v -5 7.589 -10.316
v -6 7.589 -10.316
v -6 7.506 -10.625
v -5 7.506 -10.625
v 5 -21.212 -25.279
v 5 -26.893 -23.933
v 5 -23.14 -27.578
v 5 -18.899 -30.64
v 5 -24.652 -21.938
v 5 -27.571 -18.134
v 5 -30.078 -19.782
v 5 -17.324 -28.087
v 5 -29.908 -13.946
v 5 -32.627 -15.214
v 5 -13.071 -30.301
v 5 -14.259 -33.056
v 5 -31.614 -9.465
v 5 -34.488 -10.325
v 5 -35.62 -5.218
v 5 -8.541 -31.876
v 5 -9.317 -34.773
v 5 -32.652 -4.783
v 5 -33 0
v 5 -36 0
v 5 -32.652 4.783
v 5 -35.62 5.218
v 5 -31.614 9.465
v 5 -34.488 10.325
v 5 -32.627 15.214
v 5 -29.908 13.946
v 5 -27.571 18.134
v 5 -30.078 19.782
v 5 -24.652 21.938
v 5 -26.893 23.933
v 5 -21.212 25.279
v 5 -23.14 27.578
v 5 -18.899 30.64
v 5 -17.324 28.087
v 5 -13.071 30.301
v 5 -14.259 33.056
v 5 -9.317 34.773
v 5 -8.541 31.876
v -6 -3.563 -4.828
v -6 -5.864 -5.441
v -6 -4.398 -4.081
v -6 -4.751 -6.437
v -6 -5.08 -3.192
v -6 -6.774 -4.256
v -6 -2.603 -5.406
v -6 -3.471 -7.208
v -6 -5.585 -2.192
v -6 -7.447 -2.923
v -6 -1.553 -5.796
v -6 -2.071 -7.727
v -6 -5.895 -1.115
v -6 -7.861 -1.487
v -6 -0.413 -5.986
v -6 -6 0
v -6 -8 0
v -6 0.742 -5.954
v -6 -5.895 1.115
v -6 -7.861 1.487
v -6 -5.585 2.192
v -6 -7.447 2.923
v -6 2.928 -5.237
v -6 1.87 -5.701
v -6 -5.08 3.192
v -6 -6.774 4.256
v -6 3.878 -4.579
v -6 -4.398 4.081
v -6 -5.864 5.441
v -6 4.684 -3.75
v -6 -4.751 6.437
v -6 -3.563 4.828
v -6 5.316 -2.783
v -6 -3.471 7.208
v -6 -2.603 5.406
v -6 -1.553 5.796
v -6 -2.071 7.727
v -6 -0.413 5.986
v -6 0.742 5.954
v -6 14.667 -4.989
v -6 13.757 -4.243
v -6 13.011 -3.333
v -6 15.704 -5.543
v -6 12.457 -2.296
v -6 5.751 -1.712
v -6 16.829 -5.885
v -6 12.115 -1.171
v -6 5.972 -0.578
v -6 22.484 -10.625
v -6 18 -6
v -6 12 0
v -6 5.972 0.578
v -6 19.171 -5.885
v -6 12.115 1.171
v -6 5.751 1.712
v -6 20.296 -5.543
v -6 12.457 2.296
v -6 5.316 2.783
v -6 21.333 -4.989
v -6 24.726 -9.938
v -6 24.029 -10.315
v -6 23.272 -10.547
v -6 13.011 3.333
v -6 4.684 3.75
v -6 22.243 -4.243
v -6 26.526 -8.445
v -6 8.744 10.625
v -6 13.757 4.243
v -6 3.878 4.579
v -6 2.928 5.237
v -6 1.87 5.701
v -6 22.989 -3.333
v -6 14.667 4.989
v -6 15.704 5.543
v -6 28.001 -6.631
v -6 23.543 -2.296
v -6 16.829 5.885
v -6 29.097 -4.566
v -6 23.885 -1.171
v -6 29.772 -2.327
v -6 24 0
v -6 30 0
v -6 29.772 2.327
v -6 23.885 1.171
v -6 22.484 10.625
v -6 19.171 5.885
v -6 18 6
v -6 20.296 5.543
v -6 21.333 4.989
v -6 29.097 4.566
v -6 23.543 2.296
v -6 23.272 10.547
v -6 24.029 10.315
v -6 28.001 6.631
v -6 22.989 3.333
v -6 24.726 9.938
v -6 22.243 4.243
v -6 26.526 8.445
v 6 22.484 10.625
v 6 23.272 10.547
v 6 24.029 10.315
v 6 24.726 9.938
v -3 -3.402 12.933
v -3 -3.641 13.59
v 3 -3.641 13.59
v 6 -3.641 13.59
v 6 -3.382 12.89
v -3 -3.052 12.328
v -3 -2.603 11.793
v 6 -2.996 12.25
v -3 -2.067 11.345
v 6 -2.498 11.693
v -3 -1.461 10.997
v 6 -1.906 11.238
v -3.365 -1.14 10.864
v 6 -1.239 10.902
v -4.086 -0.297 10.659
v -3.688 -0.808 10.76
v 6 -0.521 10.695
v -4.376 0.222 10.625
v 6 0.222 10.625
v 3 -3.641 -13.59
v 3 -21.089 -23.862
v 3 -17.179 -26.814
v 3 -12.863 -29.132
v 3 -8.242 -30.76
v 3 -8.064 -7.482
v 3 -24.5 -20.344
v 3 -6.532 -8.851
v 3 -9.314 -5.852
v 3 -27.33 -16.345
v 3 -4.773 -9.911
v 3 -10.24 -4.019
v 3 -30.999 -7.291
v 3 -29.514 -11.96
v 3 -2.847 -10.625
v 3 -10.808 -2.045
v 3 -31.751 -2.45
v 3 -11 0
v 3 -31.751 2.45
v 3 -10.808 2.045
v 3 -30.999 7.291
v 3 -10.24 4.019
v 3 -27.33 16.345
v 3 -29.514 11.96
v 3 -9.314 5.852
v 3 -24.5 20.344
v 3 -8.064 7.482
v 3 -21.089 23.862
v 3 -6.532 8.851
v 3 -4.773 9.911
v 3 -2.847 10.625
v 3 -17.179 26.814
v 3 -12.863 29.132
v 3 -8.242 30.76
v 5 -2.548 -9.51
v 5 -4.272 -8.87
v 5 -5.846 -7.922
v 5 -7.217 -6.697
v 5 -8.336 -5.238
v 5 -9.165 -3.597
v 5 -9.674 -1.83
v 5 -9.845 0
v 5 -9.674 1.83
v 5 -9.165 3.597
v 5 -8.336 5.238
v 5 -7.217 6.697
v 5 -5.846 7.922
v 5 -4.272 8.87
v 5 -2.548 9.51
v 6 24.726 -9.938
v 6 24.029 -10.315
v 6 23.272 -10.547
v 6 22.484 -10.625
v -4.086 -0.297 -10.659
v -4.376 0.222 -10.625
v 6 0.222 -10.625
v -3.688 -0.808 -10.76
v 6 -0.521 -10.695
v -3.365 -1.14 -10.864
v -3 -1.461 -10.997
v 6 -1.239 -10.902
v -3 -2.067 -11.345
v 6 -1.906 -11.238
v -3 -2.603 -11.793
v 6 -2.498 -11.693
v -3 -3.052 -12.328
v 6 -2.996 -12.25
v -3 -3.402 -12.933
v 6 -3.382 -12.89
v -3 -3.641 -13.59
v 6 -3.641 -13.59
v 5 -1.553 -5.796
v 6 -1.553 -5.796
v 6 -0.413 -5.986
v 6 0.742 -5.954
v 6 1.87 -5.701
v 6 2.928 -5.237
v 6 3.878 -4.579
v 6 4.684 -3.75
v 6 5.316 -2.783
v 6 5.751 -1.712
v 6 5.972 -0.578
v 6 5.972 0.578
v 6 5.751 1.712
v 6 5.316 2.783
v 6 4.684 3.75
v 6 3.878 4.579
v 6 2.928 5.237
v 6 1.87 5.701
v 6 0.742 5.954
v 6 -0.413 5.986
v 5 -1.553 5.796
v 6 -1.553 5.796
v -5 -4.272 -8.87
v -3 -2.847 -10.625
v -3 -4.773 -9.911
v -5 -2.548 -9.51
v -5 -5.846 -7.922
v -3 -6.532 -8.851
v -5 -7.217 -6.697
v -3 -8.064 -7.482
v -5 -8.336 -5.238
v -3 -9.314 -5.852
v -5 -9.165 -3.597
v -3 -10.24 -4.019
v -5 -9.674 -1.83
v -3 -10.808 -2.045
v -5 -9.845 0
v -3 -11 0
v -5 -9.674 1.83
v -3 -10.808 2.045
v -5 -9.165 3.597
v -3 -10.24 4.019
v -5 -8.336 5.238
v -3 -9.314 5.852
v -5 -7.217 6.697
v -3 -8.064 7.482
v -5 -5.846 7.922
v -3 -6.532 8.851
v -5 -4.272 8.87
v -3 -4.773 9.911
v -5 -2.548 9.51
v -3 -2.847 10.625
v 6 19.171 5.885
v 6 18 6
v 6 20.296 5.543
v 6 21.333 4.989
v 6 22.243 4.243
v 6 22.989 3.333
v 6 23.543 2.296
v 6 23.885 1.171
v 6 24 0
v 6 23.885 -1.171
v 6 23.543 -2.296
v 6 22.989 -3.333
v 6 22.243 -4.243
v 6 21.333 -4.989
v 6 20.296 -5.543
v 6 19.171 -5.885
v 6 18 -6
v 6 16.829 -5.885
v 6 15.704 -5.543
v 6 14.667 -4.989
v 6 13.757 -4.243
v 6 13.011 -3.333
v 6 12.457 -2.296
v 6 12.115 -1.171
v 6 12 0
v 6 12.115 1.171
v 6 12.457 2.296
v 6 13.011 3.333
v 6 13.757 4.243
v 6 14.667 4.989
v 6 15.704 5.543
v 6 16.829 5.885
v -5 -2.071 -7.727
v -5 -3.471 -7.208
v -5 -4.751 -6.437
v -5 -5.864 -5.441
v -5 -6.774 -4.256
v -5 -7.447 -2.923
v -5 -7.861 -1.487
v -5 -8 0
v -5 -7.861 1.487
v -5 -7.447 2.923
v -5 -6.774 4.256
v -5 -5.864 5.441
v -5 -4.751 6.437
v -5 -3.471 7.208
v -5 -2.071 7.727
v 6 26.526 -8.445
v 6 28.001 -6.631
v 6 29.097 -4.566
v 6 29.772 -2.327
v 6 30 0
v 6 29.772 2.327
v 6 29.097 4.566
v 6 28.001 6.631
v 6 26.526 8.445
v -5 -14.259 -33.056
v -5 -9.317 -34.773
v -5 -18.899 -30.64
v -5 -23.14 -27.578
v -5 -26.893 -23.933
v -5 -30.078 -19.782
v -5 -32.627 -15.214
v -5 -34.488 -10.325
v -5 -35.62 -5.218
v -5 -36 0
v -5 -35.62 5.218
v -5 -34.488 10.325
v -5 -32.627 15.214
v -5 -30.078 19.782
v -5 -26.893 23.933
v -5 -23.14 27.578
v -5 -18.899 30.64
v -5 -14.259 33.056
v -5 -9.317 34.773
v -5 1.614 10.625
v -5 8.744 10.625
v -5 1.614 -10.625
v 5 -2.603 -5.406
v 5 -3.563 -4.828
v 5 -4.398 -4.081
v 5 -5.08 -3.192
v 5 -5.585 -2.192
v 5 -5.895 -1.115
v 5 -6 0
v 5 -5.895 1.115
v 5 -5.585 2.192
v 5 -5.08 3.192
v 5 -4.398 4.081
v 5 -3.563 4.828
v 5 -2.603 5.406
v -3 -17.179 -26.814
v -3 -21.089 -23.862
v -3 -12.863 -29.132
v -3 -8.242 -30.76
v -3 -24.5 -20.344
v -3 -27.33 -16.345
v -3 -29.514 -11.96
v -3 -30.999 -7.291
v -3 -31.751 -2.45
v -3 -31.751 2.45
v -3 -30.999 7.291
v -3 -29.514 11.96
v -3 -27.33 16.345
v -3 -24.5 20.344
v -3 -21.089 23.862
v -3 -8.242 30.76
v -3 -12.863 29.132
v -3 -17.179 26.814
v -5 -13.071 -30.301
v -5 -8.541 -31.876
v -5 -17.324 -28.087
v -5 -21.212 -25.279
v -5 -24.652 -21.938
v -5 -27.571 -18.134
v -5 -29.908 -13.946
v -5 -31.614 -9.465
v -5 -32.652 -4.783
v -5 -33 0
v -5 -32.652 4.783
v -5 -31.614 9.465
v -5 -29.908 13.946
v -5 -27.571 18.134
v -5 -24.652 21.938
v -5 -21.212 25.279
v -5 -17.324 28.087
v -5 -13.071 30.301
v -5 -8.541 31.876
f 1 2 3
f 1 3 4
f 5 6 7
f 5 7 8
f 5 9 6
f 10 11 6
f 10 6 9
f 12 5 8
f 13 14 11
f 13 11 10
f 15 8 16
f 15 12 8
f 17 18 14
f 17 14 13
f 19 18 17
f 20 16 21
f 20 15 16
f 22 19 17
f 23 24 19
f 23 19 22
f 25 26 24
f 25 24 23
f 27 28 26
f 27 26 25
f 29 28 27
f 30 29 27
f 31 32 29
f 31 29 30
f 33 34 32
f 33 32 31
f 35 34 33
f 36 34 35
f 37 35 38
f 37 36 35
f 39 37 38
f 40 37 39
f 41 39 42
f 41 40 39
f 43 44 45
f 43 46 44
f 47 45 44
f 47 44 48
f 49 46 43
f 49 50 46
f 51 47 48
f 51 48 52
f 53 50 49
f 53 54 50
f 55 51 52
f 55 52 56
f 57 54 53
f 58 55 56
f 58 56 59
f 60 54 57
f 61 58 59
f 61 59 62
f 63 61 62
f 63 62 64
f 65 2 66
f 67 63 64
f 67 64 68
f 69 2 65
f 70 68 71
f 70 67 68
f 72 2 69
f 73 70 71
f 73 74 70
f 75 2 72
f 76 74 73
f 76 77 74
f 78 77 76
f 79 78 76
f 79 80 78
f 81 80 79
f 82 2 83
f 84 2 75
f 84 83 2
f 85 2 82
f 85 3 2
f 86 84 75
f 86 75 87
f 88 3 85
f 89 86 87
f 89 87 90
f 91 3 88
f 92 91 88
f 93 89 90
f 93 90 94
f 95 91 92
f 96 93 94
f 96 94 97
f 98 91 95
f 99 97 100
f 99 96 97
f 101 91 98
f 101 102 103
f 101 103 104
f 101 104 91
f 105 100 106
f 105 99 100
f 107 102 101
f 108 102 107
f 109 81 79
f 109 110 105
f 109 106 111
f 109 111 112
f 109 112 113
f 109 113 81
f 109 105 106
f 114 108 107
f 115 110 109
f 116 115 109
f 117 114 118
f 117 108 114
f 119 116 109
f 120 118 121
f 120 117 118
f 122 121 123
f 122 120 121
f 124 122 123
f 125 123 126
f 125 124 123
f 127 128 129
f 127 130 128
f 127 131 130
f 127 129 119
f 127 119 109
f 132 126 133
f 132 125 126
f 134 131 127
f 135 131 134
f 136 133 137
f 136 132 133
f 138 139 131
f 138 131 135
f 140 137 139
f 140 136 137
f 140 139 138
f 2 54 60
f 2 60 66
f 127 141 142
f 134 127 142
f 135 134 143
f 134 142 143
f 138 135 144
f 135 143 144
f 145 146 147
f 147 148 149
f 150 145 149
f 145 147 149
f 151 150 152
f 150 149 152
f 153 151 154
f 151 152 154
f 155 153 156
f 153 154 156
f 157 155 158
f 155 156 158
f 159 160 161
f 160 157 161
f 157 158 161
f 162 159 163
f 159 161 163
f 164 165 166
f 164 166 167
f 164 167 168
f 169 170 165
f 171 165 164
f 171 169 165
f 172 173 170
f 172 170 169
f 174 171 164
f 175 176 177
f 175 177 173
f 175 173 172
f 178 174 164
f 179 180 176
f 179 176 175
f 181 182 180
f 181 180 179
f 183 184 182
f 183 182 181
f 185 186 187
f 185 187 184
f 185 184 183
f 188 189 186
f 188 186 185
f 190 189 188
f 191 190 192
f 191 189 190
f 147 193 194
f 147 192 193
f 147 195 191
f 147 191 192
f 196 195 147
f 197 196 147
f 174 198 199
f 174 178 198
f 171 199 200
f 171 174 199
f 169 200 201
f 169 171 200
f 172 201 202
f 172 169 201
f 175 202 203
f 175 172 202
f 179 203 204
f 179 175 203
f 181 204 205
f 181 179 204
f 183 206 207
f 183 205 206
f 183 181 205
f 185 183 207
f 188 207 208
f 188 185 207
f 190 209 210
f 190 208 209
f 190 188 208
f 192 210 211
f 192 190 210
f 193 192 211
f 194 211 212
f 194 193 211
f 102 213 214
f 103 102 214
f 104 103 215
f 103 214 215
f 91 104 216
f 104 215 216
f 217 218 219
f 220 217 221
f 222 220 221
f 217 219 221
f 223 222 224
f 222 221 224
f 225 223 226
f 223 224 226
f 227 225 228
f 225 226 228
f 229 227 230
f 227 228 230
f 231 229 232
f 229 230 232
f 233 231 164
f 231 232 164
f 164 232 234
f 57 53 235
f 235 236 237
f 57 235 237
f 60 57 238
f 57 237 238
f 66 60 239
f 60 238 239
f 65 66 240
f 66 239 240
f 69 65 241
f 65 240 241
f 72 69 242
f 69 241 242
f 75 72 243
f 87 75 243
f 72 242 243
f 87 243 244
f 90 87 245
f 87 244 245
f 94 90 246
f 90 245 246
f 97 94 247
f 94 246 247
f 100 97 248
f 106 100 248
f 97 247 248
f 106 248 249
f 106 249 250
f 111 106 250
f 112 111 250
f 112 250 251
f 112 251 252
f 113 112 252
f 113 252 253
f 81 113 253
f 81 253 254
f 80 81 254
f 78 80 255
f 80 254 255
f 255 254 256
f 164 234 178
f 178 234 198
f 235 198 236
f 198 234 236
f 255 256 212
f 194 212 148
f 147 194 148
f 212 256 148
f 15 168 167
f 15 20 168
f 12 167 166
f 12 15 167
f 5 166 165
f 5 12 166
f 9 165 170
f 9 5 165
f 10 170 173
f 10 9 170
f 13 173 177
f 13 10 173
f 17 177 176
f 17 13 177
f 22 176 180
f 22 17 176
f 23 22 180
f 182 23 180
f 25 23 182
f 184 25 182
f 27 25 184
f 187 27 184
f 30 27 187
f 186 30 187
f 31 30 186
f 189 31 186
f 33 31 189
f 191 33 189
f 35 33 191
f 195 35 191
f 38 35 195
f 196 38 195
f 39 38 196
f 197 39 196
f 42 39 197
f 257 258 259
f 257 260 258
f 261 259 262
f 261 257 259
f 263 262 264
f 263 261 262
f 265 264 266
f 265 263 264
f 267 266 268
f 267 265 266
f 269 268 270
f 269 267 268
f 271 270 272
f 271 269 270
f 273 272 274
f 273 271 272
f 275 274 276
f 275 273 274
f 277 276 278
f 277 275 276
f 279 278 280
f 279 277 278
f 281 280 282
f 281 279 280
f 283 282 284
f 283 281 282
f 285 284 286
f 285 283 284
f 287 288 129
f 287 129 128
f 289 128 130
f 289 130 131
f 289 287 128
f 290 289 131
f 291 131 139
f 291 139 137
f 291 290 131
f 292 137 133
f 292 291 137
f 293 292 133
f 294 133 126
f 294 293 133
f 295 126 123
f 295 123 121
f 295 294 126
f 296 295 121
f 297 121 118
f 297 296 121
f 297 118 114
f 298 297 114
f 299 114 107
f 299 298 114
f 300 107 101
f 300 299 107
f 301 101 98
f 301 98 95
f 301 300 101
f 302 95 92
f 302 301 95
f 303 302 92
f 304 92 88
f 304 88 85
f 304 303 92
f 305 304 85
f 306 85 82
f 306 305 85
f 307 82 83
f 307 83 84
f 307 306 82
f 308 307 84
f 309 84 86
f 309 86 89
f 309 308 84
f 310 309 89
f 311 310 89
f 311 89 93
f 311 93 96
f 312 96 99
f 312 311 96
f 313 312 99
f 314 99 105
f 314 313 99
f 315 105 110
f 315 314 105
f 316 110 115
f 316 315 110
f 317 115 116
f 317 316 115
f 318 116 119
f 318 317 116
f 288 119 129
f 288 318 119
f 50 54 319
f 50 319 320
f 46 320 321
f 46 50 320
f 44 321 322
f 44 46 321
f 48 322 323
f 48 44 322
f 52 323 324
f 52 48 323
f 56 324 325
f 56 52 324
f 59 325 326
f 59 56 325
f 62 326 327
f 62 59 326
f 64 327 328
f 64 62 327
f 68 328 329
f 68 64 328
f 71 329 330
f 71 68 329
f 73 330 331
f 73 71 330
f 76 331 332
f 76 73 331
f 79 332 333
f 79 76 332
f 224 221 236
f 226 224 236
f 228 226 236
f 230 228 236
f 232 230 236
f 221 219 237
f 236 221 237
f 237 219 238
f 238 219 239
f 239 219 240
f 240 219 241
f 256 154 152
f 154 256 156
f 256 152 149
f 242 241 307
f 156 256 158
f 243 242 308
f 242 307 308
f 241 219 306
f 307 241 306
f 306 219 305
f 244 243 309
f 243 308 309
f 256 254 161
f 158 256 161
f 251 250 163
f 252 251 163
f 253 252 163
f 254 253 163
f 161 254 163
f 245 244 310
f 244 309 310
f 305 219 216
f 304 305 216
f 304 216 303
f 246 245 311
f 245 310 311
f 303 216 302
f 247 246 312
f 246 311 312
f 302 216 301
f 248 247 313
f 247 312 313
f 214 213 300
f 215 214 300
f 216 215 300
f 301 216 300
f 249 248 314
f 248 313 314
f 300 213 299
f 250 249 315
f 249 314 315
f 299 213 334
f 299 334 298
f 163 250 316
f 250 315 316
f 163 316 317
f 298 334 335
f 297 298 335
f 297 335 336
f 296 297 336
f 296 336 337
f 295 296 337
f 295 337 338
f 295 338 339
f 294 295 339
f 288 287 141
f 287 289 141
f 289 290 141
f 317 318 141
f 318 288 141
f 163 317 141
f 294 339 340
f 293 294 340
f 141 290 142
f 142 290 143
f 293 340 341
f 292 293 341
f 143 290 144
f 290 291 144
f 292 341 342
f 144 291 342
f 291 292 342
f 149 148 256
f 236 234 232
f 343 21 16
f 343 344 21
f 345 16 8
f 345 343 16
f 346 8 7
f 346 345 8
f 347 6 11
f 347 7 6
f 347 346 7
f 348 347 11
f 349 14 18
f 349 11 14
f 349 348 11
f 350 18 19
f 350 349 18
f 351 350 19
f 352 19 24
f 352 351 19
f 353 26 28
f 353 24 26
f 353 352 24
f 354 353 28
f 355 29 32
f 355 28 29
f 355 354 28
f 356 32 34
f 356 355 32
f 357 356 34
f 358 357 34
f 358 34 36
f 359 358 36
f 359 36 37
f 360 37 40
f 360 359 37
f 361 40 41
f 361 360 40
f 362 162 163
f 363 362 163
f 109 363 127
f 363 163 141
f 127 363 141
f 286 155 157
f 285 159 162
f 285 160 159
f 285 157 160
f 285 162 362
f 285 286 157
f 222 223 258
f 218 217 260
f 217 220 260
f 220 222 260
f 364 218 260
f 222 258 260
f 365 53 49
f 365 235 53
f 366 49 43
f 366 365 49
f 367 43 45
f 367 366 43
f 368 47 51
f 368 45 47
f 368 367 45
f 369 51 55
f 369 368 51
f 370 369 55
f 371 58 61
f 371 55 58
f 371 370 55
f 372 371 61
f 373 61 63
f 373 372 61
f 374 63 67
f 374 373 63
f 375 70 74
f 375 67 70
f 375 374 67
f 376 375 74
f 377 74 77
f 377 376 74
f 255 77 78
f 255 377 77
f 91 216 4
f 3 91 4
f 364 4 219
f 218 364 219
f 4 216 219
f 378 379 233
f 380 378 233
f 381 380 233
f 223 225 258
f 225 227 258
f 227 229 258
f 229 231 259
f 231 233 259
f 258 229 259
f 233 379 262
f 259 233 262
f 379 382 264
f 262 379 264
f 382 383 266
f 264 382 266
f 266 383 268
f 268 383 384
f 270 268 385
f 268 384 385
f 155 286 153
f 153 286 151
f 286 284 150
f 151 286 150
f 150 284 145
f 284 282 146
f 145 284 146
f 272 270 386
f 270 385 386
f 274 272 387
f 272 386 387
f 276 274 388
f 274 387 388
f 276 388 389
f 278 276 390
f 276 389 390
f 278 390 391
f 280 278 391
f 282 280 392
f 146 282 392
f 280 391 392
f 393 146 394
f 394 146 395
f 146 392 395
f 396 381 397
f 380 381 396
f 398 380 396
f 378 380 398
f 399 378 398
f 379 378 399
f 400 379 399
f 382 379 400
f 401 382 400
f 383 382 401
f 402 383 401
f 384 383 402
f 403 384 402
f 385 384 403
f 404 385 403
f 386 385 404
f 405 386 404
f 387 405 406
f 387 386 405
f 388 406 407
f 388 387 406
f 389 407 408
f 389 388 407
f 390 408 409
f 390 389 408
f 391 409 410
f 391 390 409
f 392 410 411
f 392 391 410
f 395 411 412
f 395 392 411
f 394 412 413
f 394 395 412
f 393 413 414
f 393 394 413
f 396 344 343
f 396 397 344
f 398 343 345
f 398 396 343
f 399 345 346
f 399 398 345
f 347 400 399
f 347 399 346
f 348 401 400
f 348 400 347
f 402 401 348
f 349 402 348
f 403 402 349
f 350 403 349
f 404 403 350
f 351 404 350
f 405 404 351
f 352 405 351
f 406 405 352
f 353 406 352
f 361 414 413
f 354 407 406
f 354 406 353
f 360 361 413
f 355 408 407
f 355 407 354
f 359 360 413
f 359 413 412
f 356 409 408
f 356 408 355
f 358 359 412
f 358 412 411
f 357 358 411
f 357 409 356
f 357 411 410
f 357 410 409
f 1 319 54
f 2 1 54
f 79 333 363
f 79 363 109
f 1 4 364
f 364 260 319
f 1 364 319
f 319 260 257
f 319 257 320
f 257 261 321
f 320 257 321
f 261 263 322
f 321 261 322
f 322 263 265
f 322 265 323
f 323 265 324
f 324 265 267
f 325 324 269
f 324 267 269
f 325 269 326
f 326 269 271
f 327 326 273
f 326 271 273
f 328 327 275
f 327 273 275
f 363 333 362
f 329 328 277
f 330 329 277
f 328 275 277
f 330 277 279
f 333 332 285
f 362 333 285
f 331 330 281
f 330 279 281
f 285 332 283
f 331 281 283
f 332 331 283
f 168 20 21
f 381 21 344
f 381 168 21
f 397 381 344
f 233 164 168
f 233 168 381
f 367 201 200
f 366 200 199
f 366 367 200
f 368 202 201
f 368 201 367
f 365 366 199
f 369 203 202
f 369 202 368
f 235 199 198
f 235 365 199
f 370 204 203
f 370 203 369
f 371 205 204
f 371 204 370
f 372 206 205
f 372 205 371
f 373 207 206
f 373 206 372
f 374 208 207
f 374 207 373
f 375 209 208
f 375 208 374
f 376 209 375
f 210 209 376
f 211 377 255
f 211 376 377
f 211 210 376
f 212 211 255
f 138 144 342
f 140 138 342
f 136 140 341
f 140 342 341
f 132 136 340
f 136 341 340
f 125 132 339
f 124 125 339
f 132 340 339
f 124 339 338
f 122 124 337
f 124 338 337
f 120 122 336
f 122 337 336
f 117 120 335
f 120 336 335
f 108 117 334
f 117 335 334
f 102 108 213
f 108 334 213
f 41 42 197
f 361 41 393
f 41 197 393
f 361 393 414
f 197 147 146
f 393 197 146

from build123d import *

# Parameters (mm, degrees)
REVOLVE1_ANGLE           = 75
REVOLVE1_OTHER_WAY_ANGLE = 75
BOSS_EXTRUDE3_START      = -12
BOSS_EXTRUDE3_OUTLINE_R  = 6
BOSS_EXTRUDE3_DEPTH      = 12
CUT_EXTRUDE1_DEPTH       = 10
CUT_EXTRUDE2_DEPTH       = 21


# Read off the part's stored shape, not the designer's step: Boss-Extrude3
with BuildPart() as part:
    # Sketch1 → Revolve1 (revolve)
    with BuildSketch(Plane.XY):
        Polygon((-6, -8), (-6, -6), (5, -6), (5, -9.845299462), (3, -11), (3, -31.845299462), (5, -33), (5, -36), (-5, -36), (-5, -33), (-3, -31.845299462), (-3, -11), (-5, -9.845299462), (-5, -8), align=None)
    revolve(axis=Axis((0, 0, 0), (1, 0, 0)), revolution_arc=REVOLVE1_ANGLE)

    # Sketch1 → Revolve1 other way (revolve)
    with BuildSketch(Plane.XY):
        Polygon((-6, -8), (-6, -6), (5, -6), (5, -9.845299462), (3, -11), (3, -31.845299462), (5, -33), (5, -36), (-5, -36), (-5, -33), (-3, -31.845299462), (-3, -11), (-5, -9.845299462), (-5, -8), align=None)
    revolve(axis=Axis((0, 0, 0), (-1, 0, 0)), revolution_arc=REVOLVE1_OTHER_WAY_ANGLE)

    # Boss-Extrude3 outline → Boss-Extrude3 (add)
    with BuildSketch(Plane.ZY.offset(6).offset(BOSS_EXTRUDE3_START)):
        with BuildLine():
            ThreePointArc((-5.795554958, -1.552914271), (0, 6), (5.795554958, -1.552914271))
            Line((5.795554958, -1.552914271), (13.589907909, -3.641404849))
            ThreePointArc((13.589907909, -3.641404849), (11.451770728, -2.21274726), (10.625184089, 0.222298456))
            Line((10.625184089, 0.222298456), (10.625184089, 22.4840758))
            ThreePointArc((10.625184089, 22.4840758), (10.449472793, 23.656601242), (9.937776134, 24.726113701))
            ThreePointArc((9.937776134, 24.726113701), (0, 30), (-9.937776134, 24.726113701))
            ThreePointArc((-9.937776134, 24.726113701), (-10.449472793, 23.656601242), (-10.625184089, 22.4840758))
            Line((-10.625184089, 22.4840758), (-10.625184089, 0.222298456))
            ThreePointArc((-10.625184089, 0.222298456), (-11.451770728, -2.21274726), (-13.589907909, -3.641404849))
            Line((-13.589907909, -3.641404849), (-5.795554958, -1.552914271))
        make_face()
        with Locations((0, 18)):
            Circle(BOSS_EXTRUDE3_OUTLINE_R, mode=Mode.SUBTRACT)
    extrude(amount=BOSS_EXTRUDE3_DEPTH)

    # Sketch4 → Cut-Extrude1 (cut)
    with BuildSketch(Plane(origin=(0, 0, 0), x_dir=(1, 0, 0), z_dir=(0, -0.9659258262890691, 0.258819045102518))):
        Polygon((-3, -14.069307952), (-3, -11), (-5, -9.845299462), (-5, -8), (-6, -8), (-6, -14.069307952), align=None)
    extrude(amount=-CUT_EXTRUDE1_DEPTH, mode=Mode.SUBTRACT)

    # Sketch5 → Cut-Extrude2 (cut)
    with BuildSketch(Plane(origin=(0, 0, 0), x_dir=(1, 0, 0), z_dir=(0, -0.9659258262890691, -0.25881904510251813))):
        Polygon((-3, 14.069307952), (-3, 11), (-5, 9.845299462), (-5, 8), (-6, 8), (-6, 14.069307952), align=None)
    extrude(amount=-CUT_EXTRUDE2_DEPTH, mode=Mode.SUBTRACT)


solid = part.part
